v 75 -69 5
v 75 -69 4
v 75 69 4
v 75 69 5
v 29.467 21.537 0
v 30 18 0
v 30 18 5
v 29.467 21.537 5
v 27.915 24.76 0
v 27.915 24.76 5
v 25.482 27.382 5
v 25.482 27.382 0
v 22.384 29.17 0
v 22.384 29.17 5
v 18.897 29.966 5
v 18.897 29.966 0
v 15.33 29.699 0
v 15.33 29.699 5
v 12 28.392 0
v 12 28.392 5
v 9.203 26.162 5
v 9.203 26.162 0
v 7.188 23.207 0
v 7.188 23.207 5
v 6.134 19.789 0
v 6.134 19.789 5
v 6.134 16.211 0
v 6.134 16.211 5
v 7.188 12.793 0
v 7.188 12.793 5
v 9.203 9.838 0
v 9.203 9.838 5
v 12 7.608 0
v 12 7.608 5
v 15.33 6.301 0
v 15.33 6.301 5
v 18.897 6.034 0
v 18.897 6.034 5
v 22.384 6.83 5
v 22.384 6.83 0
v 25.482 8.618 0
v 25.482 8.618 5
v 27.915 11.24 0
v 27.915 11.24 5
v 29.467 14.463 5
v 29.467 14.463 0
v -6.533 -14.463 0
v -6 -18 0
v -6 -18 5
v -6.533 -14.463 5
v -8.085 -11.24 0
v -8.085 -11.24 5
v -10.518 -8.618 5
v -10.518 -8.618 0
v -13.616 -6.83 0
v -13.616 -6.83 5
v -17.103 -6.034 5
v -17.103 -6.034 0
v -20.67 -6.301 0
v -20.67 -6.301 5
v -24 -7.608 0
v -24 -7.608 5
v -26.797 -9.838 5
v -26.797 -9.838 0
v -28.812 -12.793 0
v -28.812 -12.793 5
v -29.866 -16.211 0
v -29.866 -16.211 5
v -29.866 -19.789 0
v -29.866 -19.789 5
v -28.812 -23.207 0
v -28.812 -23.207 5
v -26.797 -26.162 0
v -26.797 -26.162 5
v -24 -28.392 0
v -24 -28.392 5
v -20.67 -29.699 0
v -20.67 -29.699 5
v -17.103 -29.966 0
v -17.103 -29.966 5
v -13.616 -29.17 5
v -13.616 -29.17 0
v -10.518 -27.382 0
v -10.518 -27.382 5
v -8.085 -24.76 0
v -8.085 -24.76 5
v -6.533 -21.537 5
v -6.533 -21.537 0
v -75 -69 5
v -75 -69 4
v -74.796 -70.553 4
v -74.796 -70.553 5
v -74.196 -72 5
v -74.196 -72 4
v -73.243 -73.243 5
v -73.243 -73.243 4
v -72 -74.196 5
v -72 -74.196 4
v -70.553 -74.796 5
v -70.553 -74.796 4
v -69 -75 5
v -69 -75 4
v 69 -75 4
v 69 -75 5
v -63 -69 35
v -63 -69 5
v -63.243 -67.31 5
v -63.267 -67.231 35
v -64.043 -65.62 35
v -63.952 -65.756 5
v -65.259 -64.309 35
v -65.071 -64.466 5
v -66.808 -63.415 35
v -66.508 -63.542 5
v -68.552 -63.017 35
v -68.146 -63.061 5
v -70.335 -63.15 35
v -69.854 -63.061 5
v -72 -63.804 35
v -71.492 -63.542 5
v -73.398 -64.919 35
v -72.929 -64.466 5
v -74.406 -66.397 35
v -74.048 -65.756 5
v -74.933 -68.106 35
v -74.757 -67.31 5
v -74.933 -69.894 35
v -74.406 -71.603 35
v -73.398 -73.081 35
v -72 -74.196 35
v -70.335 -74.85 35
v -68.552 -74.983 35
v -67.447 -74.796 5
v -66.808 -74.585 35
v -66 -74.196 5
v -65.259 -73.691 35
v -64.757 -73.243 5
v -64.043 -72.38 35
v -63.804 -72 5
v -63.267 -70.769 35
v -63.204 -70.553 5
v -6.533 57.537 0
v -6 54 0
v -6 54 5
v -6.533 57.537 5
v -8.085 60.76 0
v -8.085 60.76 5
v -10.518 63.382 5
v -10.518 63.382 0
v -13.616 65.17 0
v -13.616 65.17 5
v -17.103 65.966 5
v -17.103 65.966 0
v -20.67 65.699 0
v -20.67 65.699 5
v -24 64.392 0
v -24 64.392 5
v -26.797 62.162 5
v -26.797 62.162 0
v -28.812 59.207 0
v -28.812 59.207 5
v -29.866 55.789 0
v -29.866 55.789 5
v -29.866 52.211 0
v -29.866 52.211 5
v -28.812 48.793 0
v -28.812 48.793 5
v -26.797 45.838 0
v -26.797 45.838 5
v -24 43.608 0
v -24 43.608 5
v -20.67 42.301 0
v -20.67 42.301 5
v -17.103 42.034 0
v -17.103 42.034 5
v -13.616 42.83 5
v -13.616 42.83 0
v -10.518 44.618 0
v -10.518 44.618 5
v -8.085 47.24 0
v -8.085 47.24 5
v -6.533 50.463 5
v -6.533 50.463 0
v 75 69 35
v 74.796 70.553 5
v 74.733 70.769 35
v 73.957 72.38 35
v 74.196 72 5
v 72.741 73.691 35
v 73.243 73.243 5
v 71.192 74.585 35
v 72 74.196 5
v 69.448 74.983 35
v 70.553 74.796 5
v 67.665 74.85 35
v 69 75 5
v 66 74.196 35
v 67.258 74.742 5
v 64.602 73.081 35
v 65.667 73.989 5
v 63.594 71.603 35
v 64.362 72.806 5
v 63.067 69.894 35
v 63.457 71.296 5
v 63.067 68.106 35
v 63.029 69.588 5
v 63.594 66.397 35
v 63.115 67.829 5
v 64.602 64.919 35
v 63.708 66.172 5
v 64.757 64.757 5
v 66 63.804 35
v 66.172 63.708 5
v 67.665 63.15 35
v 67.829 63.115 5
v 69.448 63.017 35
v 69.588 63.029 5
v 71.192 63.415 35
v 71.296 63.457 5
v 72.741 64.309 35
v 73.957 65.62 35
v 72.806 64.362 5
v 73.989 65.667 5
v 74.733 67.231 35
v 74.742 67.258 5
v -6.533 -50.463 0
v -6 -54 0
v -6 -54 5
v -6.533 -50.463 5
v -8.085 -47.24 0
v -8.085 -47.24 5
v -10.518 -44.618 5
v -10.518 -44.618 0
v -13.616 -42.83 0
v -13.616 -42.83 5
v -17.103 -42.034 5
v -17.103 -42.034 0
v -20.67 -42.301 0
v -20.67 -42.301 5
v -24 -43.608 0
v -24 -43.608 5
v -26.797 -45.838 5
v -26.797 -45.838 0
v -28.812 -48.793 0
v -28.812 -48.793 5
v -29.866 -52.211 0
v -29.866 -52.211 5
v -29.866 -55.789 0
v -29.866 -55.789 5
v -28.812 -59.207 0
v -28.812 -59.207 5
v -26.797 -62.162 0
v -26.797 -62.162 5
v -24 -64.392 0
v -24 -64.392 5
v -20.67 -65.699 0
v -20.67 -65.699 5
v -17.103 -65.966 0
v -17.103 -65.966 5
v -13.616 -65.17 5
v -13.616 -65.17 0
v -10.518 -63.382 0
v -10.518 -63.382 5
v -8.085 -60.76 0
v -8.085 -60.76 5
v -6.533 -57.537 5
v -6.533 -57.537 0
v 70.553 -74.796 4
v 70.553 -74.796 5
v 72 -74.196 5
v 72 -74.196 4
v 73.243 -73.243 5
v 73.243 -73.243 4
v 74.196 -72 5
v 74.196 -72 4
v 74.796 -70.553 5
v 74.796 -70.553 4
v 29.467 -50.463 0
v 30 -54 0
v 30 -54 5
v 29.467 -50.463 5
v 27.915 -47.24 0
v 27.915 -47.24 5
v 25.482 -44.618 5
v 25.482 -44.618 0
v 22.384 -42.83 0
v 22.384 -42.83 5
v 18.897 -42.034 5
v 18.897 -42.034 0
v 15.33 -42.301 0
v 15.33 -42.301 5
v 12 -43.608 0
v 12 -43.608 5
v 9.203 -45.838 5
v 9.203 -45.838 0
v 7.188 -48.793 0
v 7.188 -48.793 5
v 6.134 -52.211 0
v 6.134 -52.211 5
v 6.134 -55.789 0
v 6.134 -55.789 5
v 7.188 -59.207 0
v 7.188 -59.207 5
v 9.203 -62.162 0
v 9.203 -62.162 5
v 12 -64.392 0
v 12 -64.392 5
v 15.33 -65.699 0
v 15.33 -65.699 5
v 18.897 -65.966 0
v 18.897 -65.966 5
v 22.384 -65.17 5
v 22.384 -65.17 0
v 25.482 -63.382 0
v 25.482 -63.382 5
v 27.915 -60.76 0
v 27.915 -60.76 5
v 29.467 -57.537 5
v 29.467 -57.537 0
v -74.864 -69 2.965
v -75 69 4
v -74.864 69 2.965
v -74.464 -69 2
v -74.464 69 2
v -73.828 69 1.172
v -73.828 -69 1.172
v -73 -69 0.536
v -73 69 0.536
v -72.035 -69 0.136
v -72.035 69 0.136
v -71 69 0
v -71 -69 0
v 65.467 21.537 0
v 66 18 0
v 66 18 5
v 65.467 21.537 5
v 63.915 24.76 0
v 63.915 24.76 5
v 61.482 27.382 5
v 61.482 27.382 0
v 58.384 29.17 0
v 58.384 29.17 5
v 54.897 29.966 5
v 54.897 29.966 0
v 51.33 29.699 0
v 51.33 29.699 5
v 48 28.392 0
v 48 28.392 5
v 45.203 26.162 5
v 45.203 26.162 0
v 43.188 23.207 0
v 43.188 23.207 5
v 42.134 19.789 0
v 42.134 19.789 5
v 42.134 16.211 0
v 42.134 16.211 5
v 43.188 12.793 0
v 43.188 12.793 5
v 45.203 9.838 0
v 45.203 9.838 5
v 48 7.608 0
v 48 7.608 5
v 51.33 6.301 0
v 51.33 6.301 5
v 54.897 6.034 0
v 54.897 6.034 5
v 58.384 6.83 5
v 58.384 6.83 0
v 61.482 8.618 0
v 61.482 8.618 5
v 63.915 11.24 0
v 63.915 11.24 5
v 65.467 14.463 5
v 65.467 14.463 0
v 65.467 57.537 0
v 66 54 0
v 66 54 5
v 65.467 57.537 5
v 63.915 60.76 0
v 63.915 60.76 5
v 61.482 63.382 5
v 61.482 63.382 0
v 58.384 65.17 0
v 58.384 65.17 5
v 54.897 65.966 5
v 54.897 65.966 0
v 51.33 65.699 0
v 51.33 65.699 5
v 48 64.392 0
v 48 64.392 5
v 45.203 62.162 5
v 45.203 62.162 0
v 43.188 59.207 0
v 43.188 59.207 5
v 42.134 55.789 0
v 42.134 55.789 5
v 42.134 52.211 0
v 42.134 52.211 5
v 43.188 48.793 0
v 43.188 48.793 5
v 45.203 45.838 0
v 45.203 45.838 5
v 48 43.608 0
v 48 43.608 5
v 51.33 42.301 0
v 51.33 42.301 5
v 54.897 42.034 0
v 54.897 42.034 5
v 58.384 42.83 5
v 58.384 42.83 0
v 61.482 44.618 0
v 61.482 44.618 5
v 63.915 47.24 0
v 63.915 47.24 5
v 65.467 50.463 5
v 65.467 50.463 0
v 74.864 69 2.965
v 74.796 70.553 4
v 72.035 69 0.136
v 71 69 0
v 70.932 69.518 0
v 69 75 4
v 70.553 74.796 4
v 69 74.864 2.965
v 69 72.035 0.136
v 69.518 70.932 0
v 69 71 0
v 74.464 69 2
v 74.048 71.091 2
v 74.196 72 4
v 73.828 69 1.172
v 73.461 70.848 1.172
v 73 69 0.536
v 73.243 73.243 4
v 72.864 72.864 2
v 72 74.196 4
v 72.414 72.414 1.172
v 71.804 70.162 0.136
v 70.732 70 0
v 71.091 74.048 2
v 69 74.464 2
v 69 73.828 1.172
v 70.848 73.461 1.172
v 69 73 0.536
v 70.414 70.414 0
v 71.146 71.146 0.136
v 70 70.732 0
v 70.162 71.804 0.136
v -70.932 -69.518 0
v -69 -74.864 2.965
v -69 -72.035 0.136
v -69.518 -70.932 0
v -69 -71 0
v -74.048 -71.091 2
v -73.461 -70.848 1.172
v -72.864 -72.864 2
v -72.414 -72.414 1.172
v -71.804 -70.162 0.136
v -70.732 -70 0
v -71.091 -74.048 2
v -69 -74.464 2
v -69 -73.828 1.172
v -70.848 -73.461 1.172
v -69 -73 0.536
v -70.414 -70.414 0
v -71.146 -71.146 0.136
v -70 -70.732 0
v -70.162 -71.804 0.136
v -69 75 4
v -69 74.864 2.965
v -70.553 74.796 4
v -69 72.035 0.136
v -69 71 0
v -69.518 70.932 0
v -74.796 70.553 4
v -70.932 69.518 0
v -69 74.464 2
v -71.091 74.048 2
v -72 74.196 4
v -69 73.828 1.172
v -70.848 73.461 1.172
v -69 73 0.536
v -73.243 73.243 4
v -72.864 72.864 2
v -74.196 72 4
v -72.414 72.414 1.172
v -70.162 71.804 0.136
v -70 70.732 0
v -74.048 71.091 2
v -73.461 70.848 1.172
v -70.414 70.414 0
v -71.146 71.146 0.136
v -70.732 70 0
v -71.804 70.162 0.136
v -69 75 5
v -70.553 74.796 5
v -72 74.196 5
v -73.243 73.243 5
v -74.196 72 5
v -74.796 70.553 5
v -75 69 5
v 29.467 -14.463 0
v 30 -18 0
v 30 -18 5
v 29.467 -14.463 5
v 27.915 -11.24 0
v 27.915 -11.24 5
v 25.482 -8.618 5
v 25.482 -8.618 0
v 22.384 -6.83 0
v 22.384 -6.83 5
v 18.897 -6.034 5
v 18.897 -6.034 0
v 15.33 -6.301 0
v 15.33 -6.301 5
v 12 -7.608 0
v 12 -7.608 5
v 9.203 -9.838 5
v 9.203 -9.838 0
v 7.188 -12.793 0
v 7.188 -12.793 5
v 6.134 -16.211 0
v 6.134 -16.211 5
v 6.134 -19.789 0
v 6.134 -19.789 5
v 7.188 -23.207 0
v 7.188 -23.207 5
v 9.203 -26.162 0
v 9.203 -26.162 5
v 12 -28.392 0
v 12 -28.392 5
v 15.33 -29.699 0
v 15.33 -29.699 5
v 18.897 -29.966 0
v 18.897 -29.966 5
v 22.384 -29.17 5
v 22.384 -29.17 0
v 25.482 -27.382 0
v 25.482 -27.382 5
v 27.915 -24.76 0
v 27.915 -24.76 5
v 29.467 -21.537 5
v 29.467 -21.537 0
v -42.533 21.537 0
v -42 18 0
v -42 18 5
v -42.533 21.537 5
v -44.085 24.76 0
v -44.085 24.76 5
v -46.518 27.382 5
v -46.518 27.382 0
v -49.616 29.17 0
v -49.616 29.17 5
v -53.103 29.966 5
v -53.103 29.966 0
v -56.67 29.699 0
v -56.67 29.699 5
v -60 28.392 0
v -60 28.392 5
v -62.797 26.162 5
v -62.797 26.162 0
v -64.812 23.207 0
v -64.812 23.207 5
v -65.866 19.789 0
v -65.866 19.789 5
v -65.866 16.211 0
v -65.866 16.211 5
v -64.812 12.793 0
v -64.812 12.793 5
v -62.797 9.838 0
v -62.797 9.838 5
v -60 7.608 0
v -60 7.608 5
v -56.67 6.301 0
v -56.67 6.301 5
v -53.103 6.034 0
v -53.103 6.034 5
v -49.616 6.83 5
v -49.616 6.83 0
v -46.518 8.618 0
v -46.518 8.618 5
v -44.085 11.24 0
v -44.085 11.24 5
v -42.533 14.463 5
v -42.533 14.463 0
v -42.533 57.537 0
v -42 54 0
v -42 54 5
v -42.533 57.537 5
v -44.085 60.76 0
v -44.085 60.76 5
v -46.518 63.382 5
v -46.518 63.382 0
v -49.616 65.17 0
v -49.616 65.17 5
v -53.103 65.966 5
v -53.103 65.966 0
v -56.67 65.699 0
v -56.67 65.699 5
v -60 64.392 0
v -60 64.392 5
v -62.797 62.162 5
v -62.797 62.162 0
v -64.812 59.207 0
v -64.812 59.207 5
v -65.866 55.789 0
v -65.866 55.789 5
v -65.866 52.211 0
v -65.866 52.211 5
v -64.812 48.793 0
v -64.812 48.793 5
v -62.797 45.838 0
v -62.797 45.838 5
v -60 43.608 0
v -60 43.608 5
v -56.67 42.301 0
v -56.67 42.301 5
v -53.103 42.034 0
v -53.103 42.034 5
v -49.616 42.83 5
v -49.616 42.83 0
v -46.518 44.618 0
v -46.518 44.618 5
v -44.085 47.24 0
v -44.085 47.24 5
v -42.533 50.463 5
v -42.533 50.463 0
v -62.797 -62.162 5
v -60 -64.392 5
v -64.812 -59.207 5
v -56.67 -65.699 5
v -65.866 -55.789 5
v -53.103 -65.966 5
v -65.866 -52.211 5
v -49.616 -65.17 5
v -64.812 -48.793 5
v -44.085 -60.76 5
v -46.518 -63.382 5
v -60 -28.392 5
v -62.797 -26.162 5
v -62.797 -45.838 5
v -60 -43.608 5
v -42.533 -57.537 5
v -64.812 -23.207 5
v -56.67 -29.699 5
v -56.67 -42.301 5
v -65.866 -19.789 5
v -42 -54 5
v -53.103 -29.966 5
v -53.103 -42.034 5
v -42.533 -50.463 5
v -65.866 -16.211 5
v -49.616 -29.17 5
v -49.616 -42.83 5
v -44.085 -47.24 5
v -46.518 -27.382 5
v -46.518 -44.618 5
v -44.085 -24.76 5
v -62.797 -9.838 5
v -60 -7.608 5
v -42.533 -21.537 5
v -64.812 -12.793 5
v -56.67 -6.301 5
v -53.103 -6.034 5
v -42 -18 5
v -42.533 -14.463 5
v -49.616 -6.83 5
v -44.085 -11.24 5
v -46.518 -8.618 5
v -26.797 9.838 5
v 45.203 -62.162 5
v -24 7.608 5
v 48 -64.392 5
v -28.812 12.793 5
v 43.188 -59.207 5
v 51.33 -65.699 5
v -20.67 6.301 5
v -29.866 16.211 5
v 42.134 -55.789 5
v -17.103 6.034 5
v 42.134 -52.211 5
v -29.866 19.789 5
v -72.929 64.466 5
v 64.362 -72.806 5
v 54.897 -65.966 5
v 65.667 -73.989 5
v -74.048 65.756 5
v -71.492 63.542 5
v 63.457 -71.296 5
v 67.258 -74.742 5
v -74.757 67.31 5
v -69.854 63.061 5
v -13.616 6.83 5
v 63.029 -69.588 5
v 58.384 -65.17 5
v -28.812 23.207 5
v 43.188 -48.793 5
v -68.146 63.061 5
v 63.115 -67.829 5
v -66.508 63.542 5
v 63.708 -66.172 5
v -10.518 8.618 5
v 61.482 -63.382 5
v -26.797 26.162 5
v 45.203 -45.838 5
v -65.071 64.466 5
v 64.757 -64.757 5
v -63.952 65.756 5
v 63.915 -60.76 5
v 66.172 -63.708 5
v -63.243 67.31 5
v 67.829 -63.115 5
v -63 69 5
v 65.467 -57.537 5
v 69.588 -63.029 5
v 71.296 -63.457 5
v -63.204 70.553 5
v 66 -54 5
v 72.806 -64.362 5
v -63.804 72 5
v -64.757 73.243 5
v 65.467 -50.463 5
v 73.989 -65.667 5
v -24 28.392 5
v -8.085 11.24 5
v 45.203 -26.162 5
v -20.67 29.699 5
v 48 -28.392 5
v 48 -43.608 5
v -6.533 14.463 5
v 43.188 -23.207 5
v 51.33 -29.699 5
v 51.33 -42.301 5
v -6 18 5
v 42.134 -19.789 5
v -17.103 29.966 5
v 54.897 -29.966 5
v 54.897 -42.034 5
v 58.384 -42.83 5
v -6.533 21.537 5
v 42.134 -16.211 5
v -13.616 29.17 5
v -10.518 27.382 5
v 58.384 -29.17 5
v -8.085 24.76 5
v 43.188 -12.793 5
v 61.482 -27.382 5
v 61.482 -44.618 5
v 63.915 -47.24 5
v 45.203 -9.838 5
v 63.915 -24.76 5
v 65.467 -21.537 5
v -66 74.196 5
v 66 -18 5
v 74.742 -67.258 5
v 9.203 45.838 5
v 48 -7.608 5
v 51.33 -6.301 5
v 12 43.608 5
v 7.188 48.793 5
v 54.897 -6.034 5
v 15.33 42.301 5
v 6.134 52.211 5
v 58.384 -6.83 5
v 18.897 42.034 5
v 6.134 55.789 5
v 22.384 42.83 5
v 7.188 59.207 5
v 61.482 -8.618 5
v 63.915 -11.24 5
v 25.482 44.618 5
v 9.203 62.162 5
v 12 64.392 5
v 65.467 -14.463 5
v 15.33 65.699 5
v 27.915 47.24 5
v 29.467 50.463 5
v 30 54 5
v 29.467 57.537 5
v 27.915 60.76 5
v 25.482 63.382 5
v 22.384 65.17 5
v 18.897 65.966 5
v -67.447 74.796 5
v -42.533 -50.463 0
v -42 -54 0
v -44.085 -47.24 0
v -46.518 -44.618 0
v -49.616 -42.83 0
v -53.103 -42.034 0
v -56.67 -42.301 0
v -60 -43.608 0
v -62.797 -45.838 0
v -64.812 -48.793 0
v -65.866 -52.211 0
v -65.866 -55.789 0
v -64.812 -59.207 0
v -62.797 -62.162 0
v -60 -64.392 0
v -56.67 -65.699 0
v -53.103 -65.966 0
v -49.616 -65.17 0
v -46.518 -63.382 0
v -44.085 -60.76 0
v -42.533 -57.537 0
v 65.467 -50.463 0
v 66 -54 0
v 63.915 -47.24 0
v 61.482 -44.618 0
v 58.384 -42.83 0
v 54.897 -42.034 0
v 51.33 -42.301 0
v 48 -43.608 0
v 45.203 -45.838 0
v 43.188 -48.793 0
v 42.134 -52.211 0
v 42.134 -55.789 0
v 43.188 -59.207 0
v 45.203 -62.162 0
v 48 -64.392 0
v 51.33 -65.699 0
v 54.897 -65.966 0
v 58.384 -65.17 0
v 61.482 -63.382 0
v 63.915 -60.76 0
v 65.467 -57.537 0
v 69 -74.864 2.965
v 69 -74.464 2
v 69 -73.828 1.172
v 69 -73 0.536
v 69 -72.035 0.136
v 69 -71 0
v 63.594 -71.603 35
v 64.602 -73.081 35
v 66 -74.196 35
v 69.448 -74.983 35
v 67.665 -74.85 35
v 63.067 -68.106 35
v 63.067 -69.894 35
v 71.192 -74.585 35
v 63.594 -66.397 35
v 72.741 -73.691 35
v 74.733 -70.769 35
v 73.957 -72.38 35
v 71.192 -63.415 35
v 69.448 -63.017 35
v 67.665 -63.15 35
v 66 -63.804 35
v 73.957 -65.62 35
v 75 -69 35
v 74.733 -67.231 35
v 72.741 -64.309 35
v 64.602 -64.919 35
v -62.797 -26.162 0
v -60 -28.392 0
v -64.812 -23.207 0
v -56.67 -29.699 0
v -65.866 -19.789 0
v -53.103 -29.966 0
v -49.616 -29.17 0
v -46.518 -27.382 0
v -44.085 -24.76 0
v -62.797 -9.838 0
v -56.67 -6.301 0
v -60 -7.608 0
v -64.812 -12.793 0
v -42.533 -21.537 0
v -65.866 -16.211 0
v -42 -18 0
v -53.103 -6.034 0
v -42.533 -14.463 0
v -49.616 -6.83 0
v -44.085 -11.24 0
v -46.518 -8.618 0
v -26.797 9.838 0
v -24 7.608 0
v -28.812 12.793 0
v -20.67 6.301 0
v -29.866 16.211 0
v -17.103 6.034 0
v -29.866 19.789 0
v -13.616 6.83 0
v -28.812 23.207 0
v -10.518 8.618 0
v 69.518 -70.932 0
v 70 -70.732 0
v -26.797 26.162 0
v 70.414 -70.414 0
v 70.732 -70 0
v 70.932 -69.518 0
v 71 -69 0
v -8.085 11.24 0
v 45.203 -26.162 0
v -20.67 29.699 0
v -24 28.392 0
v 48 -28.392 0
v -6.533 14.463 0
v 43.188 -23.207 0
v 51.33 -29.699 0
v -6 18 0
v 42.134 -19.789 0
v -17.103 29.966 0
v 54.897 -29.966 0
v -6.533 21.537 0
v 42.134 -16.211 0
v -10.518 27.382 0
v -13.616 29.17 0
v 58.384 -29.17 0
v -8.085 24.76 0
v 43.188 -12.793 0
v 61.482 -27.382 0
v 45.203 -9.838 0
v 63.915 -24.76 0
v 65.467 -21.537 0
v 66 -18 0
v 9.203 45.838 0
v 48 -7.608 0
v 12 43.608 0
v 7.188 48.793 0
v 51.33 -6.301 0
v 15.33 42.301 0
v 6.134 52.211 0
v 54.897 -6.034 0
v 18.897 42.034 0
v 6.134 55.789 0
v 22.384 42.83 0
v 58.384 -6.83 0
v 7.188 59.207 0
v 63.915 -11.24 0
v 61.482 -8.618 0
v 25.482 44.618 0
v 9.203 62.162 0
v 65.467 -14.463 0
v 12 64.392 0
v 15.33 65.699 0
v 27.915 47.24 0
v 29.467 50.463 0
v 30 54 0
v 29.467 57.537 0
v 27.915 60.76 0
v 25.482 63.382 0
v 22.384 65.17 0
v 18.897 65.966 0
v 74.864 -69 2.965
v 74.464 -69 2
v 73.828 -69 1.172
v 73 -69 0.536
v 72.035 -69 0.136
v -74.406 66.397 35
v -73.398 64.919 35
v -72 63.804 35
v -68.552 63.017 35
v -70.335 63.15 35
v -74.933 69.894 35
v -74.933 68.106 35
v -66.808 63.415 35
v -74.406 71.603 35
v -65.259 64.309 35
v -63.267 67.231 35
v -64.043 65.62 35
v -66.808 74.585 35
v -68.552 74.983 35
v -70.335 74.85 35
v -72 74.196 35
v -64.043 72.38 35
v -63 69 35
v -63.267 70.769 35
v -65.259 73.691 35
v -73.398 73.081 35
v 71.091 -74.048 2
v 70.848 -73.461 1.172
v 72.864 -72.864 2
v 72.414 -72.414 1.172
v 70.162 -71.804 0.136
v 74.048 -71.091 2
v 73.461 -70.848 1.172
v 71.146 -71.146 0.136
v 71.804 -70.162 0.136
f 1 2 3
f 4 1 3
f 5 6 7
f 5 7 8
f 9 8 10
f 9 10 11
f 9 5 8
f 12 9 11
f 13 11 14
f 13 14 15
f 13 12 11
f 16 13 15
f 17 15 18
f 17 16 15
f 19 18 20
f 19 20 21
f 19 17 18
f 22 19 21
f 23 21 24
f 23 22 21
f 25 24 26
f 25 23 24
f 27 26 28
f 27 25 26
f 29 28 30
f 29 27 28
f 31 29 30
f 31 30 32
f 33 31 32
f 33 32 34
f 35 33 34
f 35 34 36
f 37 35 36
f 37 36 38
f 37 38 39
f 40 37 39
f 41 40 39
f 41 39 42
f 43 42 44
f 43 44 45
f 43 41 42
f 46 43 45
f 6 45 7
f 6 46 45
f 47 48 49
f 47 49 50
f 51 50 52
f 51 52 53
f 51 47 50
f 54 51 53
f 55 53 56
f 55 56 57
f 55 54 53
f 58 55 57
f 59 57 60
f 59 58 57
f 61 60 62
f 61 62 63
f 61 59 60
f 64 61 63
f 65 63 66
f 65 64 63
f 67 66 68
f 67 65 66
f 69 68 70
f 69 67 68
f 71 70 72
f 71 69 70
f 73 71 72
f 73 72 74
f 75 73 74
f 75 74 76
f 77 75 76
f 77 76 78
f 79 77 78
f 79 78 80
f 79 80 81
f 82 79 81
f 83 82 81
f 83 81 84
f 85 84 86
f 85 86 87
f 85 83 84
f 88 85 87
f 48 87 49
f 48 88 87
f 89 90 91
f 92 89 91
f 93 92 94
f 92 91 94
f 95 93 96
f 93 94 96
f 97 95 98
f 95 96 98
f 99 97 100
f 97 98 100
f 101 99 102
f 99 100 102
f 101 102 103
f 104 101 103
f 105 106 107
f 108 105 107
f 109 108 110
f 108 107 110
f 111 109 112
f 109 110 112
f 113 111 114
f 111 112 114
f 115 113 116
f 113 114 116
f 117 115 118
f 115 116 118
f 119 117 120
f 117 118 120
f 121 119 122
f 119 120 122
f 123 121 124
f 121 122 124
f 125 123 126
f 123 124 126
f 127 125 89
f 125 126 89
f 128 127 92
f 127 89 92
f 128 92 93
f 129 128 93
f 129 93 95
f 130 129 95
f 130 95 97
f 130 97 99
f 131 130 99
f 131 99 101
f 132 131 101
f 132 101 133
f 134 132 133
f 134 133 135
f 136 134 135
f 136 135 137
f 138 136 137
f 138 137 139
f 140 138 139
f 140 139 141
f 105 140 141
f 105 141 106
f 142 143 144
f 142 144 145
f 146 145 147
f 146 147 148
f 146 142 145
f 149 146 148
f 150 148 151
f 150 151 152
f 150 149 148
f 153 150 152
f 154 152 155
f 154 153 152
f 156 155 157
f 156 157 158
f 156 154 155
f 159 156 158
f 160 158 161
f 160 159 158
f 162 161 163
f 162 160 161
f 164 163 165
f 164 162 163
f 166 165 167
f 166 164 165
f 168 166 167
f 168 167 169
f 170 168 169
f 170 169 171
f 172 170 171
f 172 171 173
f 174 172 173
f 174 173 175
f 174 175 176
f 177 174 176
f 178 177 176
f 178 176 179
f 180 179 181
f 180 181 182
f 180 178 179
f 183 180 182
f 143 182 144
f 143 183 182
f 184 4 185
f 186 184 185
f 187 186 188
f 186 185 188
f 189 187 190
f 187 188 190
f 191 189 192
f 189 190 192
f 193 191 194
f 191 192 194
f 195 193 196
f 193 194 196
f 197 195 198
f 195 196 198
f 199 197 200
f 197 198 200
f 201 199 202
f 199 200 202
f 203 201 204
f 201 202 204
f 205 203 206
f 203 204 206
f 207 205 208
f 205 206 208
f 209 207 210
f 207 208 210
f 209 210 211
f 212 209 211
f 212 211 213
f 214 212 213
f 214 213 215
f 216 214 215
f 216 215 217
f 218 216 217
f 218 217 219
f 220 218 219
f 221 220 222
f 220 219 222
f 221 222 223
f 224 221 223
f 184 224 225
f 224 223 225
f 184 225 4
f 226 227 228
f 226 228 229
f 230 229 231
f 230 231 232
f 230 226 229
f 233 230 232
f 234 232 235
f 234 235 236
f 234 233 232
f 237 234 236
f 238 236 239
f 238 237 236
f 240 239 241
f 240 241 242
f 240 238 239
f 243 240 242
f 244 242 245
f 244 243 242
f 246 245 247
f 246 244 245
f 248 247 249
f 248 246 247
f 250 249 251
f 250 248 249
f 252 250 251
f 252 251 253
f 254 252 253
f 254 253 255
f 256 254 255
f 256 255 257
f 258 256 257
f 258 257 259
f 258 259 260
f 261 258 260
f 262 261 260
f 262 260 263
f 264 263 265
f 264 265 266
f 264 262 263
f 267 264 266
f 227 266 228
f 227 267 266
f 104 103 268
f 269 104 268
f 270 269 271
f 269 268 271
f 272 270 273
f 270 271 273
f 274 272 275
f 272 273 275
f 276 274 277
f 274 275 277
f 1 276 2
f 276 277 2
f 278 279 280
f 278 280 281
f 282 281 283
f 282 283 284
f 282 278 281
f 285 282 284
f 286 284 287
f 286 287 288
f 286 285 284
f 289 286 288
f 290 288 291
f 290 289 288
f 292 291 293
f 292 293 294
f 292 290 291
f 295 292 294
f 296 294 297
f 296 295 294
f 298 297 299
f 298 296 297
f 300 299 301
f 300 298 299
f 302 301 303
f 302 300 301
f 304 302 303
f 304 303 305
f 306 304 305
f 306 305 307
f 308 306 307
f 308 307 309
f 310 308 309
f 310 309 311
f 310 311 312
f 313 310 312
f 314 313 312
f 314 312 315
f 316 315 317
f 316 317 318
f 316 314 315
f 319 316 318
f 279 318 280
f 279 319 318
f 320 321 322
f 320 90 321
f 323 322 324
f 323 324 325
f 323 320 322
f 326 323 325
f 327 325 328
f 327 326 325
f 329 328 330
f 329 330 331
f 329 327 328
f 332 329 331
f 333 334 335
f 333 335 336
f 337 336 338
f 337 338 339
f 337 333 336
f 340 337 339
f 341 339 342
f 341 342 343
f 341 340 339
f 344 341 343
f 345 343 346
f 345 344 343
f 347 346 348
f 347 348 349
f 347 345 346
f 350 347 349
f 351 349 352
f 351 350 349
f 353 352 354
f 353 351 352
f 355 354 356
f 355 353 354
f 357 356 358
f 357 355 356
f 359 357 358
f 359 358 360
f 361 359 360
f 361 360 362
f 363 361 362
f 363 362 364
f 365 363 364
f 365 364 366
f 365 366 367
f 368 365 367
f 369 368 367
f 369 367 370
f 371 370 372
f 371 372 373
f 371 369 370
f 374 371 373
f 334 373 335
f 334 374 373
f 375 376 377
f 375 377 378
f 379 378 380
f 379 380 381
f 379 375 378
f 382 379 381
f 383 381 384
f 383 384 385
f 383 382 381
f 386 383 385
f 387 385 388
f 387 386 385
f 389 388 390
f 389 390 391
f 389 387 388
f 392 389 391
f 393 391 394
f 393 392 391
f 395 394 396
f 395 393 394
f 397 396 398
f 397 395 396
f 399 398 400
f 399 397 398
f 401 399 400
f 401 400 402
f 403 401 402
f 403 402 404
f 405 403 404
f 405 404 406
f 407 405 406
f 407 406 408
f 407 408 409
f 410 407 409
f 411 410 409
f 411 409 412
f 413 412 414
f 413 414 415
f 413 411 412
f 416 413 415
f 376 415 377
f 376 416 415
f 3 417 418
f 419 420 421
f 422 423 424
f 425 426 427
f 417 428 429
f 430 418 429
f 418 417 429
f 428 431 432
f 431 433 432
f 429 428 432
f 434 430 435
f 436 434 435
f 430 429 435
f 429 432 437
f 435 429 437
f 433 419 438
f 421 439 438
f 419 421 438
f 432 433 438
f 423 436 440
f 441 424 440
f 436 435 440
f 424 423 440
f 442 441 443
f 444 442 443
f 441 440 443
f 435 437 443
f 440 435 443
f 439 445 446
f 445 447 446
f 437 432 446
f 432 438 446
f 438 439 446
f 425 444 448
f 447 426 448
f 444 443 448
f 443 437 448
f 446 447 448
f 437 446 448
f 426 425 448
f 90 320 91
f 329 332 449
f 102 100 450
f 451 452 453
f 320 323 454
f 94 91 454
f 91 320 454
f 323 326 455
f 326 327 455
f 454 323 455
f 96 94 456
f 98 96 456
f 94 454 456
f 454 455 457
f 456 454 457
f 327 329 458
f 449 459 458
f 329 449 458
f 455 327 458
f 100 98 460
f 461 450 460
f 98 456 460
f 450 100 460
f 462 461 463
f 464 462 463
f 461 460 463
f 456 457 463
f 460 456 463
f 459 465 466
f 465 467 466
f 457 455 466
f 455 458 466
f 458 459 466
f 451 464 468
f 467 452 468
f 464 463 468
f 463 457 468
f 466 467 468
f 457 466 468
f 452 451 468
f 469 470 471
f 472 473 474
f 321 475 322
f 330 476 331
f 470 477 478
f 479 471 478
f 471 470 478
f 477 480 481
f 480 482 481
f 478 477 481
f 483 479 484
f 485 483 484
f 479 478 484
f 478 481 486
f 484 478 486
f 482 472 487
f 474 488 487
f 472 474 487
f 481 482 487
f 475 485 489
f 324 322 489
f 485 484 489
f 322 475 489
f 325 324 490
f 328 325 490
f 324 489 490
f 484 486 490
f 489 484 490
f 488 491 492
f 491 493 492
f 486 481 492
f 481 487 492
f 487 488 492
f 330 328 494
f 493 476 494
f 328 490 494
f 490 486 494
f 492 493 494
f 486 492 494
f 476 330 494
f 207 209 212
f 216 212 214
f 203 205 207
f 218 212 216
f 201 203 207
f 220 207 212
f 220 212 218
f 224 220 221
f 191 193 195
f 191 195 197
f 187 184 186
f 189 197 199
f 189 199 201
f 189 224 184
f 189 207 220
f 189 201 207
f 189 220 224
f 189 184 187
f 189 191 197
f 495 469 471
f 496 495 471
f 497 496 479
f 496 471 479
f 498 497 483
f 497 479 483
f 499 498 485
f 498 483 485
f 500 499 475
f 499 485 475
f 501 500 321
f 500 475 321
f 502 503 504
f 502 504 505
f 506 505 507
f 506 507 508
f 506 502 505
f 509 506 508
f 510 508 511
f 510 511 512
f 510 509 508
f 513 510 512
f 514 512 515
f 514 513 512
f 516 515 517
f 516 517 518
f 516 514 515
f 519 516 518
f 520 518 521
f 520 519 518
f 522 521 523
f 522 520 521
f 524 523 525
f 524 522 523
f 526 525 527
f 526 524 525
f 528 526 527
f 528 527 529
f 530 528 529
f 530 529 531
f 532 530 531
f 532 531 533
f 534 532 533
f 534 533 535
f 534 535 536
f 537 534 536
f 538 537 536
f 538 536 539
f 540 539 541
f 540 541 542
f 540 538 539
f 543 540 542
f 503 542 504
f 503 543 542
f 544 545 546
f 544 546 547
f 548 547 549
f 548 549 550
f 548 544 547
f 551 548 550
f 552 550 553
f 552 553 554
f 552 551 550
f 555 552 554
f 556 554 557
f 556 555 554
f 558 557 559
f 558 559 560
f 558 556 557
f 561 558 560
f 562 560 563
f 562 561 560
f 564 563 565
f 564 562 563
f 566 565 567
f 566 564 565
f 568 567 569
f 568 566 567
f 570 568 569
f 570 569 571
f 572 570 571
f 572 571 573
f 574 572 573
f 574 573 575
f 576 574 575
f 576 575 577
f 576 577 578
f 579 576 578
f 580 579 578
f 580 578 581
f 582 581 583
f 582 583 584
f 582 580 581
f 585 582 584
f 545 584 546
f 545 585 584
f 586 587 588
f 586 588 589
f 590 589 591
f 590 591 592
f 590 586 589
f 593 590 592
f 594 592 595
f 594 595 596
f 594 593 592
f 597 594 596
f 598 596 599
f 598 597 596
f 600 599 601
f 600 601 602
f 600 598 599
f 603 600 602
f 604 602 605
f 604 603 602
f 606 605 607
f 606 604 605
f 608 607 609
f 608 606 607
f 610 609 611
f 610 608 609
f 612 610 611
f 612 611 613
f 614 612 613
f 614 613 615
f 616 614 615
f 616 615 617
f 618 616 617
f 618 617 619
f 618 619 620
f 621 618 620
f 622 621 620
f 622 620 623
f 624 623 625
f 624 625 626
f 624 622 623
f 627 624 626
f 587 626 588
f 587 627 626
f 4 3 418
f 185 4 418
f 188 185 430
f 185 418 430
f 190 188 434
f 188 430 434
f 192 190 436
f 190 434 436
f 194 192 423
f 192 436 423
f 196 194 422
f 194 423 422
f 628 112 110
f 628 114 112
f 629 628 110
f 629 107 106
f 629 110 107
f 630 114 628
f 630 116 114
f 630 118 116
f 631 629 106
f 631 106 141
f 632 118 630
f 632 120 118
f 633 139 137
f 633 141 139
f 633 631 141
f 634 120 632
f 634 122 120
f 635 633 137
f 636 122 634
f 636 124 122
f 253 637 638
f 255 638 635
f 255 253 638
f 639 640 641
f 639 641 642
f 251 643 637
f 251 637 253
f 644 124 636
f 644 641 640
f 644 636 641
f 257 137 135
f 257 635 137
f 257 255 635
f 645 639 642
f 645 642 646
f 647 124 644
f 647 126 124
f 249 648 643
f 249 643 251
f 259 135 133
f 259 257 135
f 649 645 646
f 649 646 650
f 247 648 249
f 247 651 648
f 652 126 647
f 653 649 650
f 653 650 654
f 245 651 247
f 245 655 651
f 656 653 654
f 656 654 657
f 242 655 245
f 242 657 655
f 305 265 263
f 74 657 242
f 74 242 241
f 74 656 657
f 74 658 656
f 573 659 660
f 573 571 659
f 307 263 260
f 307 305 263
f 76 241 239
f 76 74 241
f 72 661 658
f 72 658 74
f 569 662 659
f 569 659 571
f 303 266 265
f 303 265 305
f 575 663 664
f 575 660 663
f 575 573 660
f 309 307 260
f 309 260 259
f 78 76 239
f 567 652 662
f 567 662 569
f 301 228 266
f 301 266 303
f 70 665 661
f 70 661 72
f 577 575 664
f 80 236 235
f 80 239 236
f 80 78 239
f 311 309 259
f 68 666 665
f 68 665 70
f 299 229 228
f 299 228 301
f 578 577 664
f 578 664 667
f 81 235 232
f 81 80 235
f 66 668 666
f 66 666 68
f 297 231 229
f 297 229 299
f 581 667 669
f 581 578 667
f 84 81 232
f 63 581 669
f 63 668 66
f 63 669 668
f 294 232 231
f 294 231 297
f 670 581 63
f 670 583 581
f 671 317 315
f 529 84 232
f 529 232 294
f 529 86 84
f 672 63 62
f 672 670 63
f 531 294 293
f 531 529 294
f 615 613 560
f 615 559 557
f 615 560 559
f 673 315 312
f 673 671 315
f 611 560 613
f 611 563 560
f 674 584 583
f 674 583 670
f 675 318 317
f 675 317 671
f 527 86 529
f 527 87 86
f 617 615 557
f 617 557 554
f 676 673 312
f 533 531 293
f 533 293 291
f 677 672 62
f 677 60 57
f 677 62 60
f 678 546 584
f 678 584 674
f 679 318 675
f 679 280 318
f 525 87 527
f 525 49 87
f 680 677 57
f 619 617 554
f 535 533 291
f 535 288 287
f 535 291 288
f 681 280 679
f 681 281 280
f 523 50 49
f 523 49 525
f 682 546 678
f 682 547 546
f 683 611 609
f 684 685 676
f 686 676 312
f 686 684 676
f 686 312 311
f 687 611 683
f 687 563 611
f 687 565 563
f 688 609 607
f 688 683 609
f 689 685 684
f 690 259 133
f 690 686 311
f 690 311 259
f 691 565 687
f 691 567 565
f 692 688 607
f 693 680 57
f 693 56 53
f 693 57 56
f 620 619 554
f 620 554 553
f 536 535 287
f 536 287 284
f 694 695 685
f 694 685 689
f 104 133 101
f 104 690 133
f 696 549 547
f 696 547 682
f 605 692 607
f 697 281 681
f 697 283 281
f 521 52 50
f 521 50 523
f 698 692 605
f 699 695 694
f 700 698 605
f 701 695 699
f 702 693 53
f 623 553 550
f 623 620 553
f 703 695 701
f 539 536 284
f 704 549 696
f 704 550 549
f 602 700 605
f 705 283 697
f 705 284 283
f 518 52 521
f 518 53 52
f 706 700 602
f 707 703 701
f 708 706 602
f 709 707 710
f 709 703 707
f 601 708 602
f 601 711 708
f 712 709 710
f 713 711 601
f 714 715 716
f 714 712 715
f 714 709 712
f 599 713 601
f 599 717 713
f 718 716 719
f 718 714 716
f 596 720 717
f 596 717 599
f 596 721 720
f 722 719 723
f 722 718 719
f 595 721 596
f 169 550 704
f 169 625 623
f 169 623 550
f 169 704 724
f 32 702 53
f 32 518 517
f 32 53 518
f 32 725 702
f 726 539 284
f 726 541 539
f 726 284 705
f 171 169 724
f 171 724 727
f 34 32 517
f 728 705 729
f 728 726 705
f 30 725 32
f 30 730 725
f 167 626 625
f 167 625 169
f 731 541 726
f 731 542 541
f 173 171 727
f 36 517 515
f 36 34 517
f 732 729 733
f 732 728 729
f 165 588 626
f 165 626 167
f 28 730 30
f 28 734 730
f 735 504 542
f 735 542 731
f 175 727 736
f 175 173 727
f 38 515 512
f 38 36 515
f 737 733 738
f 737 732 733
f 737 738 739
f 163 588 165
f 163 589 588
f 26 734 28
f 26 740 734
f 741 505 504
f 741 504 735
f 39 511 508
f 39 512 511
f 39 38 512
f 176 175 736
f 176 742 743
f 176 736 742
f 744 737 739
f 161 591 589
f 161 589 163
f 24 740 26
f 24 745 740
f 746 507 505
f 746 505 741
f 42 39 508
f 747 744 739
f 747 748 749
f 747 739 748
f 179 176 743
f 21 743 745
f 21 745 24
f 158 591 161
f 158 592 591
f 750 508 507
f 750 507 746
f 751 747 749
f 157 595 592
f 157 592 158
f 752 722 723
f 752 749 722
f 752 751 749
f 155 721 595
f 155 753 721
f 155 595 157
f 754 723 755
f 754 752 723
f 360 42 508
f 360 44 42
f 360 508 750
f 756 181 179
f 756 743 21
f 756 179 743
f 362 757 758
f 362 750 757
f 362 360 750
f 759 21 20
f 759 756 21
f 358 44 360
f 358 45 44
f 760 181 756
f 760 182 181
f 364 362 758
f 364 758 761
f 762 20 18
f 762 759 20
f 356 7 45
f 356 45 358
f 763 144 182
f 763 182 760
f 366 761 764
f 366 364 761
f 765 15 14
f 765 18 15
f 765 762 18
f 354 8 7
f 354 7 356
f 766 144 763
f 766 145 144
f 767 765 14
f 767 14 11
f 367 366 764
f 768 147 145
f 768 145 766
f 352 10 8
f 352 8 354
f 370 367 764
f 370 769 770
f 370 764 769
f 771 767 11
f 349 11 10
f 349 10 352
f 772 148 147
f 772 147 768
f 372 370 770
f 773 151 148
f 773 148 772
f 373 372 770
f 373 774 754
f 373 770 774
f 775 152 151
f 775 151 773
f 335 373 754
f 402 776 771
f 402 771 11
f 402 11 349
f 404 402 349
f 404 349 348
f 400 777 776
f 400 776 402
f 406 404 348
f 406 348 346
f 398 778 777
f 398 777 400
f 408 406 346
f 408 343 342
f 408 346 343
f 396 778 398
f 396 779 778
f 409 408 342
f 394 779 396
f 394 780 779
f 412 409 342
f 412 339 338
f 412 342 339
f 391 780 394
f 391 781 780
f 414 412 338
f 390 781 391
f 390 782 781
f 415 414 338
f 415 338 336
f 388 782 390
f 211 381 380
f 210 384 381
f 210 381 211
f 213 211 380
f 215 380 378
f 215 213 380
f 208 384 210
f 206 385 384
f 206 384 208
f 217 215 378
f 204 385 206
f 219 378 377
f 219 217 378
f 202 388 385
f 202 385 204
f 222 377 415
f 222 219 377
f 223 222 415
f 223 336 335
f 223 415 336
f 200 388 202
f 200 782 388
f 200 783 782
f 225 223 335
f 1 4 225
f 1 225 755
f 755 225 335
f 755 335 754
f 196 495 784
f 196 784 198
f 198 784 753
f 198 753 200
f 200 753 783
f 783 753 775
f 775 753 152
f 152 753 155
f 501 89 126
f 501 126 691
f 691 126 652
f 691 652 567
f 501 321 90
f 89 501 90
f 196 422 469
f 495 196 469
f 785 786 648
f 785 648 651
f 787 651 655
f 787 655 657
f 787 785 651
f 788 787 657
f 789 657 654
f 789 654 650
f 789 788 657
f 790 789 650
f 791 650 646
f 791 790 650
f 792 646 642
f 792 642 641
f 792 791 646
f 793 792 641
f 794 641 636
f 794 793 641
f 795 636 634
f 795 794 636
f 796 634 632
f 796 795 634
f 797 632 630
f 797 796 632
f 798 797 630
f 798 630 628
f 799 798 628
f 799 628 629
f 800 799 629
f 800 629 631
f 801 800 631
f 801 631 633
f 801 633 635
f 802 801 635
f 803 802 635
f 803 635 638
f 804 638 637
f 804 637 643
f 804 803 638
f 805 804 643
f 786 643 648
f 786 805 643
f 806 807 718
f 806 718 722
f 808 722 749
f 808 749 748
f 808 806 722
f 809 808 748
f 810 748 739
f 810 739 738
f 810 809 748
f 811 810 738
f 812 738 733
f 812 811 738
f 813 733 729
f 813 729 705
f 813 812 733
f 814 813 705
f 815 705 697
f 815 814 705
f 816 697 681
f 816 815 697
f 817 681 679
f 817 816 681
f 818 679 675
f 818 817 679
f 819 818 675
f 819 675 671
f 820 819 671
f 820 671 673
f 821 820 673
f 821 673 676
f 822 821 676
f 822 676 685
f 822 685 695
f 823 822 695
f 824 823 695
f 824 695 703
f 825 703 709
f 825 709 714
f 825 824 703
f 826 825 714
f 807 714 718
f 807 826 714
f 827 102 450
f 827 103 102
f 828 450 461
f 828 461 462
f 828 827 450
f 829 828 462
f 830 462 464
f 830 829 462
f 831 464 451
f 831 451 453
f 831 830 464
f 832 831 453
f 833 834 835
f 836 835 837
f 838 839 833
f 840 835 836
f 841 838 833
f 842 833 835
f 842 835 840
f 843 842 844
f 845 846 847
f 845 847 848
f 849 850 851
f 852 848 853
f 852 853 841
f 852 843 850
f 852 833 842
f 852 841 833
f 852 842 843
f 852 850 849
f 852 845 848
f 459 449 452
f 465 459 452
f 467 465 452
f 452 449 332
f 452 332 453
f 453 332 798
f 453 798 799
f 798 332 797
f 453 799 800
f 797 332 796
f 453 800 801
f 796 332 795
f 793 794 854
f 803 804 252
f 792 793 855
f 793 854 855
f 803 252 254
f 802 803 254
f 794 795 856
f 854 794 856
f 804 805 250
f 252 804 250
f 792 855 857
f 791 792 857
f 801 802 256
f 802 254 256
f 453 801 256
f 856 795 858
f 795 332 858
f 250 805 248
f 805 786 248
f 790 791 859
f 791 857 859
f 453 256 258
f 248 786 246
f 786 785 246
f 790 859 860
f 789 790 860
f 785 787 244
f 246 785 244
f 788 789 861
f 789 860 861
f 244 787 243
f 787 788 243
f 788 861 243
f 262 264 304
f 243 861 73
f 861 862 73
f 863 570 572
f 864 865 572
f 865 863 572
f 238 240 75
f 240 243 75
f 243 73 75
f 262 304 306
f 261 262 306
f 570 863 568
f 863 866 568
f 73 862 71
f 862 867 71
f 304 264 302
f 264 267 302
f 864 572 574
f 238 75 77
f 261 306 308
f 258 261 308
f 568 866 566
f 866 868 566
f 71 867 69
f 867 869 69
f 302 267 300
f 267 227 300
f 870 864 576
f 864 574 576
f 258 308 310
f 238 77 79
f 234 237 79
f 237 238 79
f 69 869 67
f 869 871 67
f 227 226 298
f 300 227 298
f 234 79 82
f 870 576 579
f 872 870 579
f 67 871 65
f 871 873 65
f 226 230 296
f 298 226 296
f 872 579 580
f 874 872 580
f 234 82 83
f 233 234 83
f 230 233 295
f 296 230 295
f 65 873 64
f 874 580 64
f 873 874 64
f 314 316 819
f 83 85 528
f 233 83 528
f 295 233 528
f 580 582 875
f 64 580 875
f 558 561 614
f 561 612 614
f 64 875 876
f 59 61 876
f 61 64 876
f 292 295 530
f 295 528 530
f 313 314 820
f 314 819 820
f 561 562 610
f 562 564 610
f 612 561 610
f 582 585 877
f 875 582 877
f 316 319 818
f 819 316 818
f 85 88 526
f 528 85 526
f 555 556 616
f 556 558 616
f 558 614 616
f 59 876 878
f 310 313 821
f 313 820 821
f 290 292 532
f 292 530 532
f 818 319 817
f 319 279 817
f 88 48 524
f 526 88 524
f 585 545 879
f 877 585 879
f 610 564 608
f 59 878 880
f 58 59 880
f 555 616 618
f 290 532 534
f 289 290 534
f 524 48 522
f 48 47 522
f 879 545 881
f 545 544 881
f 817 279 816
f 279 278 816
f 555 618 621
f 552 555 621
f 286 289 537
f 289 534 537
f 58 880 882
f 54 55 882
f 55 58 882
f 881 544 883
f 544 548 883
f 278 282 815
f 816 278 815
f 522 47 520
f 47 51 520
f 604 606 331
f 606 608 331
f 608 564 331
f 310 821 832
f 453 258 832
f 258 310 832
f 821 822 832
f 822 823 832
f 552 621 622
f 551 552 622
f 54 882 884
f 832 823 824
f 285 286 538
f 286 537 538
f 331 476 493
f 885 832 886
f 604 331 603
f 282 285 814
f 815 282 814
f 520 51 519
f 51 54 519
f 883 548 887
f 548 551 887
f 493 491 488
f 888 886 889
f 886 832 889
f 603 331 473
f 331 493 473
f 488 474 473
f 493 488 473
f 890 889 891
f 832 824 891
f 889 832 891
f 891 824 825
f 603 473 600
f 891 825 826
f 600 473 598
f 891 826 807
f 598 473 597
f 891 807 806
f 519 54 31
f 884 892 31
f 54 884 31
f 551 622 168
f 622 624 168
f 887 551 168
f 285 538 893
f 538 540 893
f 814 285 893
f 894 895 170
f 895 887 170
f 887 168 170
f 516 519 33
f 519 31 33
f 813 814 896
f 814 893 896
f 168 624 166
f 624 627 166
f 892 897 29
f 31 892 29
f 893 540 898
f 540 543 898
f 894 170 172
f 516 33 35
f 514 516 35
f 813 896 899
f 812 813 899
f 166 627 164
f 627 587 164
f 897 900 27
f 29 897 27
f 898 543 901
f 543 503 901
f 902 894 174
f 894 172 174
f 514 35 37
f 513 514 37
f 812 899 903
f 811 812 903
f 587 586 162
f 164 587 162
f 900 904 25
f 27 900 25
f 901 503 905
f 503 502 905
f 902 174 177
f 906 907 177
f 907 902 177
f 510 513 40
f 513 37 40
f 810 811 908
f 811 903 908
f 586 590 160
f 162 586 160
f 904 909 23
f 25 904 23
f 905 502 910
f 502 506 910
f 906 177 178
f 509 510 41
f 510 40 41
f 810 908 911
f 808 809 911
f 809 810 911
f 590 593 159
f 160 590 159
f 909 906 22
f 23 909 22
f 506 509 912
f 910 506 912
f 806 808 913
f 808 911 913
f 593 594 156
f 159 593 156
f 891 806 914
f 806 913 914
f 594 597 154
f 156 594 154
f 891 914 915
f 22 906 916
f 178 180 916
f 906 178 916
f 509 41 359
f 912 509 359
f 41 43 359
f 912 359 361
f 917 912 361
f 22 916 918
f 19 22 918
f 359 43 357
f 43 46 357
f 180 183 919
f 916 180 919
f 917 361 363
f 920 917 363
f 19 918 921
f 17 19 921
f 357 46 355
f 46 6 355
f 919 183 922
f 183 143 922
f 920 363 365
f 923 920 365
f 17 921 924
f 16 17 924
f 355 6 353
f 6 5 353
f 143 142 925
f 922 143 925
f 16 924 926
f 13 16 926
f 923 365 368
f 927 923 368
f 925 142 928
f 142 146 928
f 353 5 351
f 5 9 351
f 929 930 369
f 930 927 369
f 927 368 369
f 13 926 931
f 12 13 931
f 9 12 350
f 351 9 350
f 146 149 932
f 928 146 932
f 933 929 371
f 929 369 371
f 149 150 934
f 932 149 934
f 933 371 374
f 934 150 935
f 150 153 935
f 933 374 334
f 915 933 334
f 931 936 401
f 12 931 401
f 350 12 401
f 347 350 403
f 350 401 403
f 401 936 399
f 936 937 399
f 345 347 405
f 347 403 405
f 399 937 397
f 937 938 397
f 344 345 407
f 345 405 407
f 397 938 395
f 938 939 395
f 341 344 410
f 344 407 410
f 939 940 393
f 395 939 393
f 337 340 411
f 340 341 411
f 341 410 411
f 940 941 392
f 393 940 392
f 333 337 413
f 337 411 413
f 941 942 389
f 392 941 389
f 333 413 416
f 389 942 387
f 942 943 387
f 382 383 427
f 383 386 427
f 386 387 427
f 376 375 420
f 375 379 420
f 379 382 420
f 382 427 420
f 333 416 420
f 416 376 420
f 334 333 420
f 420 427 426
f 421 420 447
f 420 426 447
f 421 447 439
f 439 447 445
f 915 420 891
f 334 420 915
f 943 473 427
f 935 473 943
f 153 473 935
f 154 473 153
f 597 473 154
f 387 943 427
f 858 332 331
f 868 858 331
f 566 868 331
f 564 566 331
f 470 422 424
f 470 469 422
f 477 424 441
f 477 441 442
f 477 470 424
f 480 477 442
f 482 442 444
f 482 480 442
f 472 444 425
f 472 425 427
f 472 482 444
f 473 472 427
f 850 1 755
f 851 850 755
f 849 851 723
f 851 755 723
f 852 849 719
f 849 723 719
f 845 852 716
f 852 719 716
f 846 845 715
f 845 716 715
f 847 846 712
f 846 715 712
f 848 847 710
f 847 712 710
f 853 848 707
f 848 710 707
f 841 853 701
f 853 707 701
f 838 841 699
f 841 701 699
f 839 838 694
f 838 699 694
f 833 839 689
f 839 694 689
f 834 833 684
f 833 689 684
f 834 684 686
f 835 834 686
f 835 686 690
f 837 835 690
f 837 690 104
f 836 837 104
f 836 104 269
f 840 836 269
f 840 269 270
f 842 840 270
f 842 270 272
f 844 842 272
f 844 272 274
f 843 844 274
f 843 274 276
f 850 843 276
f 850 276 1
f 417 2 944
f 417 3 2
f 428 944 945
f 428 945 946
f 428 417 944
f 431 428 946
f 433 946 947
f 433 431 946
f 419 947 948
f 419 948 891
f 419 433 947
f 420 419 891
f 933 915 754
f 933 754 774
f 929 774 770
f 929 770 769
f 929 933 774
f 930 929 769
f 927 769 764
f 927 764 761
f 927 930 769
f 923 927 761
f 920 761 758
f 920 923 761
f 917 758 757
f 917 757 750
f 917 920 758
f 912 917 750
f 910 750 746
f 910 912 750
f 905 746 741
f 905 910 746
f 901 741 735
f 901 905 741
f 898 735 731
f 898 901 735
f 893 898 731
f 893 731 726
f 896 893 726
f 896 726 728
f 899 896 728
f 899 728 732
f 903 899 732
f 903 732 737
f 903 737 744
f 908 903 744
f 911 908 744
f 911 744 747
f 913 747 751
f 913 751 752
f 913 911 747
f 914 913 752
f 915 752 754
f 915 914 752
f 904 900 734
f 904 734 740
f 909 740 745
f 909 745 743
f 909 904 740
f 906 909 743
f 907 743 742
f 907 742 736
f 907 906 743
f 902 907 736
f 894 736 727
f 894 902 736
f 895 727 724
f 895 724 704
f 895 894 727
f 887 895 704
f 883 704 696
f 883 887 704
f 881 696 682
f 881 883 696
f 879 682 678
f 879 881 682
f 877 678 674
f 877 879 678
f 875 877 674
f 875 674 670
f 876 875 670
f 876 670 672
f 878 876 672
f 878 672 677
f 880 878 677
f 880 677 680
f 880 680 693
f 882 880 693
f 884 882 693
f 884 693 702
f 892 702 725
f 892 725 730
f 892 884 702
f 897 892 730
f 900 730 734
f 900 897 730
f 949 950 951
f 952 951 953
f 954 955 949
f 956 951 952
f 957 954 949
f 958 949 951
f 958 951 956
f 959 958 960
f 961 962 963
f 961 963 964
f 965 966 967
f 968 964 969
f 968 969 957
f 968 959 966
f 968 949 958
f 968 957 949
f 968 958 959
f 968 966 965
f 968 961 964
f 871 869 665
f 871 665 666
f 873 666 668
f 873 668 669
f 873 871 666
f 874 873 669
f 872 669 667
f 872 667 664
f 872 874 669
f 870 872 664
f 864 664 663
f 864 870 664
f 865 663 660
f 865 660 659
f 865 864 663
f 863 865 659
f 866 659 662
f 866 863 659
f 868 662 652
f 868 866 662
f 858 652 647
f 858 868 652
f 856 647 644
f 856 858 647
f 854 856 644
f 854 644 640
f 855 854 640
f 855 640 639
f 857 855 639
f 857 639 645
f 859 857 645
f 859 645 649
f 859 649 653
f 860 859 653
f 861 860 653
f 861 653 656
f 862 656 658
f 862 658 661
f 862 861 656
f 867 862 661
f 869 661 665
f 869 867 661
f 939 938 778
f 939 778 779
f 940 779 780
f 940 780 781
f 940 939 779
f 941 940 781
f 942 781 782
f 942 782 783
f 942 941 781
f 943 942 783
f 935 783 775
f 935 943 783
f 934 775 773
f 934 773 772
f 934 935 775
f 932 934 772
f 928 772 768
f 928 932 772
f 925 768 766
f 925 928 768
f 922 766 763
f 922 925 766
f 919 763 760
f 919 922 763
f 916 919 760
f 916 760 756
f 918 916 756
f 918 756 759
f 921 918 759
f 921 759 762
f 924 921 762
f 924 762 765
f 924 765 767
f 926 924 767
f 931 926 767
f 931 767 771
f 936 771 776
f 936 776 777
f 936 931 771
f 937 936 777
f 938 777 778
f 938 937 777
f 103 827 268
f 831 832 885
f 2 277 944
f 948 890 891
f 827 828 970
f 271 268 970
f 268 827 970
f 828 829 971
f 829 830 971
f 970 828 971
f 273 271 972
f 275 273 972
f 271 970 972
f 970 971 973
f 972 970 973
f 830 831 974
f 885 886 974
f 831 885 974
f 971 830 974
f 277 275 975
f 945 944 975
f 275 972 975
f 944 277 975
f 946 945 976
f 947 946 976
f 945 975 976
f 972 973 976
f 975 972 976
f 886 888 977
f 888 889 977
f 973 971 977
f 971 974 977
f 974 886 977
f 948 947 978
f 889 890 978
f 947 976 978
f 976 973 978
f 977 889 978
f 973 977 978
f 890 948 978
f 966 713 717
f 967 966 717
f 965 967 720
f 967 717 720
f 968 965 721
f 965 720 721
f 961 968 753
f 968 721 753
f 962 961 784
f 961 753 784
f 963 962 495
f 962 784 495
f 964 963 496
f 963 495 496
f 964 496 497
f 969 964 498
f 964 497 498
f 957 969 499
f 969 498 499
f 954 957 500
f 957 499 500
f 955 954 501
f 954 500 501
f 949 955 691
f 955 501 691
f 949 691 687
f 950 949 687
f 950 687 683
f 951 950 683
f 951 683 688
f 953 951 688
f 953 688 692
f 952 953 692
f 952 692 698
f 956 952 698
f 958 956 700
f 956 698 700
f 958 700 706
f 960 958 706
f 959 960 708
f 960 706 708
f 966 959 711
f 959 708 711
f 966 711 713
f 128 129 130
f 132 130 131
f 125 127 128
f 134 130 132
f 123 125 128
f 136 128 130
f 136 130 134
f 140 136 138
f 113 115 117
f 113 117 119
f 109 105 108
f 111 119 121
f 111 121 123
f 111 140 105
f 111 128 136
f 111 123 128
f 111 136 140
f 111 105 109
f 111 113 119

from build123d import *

# Parameters (mm, degrees)
SKETCH_R     = 12
PAD_DEPTH    = 5
SKETCH001_R  = 6
PAD001_DEPTH = 30
FILLET_R     = 4


with BuildPart() as part:
    # Sketch → Pad (new body)
    with BuildSketch(Plane.XY):
        with BuildLine():
            Line((-69, -75), (69, -75))
            ThreePointArc((69, -75), (73.242641, -73.242641), (75, -69))
            Line((75, -69), (75, 69))
            ThreePointArc((75, 69), (73.242641, 73.242641), (69, 75))
            Line((69, 75), (-69, 75))
            ThreePointArc((-69, 75), (-73.242641, 73.242641), (-75, 69))
            Line((-75, 69), (-75, -69))
            ThreePointArc((-75, -69), (-73.242641, -73.242641), (-69, -75))
        make_face()
        with Locations((-54, 54)):
            Circle(SKETCH_R, mode=Mode.SUBTRACT)
        with Locations((-18, 54)):
            Circle(SKETCH_R, mode=Mode.SUBTRACT)
        with Locations((18, 54)):
            Circle(SKETCH_R, mode=Mode.SUBTRACT)
        with Locations((54, 54)):
            Circle(SKETCH_R, mode=Mode.SUBTRACT)
        with Locations((-54, 18)):
            Circle(SKETCH_R, mode=Mode.SUBTRACT)
        with Locations((-18, 18)):
            Circle(SKETCH_R, mode=Mode.SUBTRACT)
        with Locations((18, 18)):
            Circle(SKETCH_R, mode=Mode.SUBTRACT)
        with Locations((54, 18)):
            Circle(SKETCH_R, mode=Mode.SUBTRACT)
        with Locations((-54, -18)):
            Circle(SKETCH_R, mode=Mode.SUBTRACT)
        with Locations((-18, -18)):
            Circle(SKETCH_R, mode=Mode.SUBTRACT)
        with Locations((18, -18)):
            Circle(SKETCH_R, mode=Mode.SUBTRACT)
        with Locations((54, -18)):
            Circle(SKETCH_R, mode=Mode.SUBTRACT)
        with Locations((-54, -54)):
            Circle(SKETCH_R, mode=Mode.SUBTRACT)
        with Locations((-18, -54)):
            Circle(SKETCH_R, mode=Mode.SUBTRACT)
        with Locations((18, -54)):
            Circle(SKETCH_R, mode=Mode.SUBTRACT)
        with Locations((54, -54)):
            Circle(SKETCH_R, mode=Mode.SUBTRACT)
    extrude(amount=PAD_DEPTH)

    # Sketch001 (on Face26 of Pad) → Pad001 (join)
    with BuildSketch(Plane.XY.offset(5)):
        with Locations((-69, 69)):
            Circle(SKETCH001_R)
        with Locations((69, 69)):
            Circle(SKETCH001_R)
        with Locations((69, -69)):
            Circle(SKETCH001_R)
        with Locations((-69, -69)):
            Circle(SKETCH001_R)
    extrude(amount=PAD001_DEPTH)

    # Fillet
    fillet_edges = [part.edges().sort_by_distance(p)[0] for p in [
        (0, -75, 0),
        (-75, 0, 0),
        (0, 75, 0),
        (75, 0, 0),
    ]]
    fillet(fillet_edges, radius=FILLET_R)


solid = part.part
